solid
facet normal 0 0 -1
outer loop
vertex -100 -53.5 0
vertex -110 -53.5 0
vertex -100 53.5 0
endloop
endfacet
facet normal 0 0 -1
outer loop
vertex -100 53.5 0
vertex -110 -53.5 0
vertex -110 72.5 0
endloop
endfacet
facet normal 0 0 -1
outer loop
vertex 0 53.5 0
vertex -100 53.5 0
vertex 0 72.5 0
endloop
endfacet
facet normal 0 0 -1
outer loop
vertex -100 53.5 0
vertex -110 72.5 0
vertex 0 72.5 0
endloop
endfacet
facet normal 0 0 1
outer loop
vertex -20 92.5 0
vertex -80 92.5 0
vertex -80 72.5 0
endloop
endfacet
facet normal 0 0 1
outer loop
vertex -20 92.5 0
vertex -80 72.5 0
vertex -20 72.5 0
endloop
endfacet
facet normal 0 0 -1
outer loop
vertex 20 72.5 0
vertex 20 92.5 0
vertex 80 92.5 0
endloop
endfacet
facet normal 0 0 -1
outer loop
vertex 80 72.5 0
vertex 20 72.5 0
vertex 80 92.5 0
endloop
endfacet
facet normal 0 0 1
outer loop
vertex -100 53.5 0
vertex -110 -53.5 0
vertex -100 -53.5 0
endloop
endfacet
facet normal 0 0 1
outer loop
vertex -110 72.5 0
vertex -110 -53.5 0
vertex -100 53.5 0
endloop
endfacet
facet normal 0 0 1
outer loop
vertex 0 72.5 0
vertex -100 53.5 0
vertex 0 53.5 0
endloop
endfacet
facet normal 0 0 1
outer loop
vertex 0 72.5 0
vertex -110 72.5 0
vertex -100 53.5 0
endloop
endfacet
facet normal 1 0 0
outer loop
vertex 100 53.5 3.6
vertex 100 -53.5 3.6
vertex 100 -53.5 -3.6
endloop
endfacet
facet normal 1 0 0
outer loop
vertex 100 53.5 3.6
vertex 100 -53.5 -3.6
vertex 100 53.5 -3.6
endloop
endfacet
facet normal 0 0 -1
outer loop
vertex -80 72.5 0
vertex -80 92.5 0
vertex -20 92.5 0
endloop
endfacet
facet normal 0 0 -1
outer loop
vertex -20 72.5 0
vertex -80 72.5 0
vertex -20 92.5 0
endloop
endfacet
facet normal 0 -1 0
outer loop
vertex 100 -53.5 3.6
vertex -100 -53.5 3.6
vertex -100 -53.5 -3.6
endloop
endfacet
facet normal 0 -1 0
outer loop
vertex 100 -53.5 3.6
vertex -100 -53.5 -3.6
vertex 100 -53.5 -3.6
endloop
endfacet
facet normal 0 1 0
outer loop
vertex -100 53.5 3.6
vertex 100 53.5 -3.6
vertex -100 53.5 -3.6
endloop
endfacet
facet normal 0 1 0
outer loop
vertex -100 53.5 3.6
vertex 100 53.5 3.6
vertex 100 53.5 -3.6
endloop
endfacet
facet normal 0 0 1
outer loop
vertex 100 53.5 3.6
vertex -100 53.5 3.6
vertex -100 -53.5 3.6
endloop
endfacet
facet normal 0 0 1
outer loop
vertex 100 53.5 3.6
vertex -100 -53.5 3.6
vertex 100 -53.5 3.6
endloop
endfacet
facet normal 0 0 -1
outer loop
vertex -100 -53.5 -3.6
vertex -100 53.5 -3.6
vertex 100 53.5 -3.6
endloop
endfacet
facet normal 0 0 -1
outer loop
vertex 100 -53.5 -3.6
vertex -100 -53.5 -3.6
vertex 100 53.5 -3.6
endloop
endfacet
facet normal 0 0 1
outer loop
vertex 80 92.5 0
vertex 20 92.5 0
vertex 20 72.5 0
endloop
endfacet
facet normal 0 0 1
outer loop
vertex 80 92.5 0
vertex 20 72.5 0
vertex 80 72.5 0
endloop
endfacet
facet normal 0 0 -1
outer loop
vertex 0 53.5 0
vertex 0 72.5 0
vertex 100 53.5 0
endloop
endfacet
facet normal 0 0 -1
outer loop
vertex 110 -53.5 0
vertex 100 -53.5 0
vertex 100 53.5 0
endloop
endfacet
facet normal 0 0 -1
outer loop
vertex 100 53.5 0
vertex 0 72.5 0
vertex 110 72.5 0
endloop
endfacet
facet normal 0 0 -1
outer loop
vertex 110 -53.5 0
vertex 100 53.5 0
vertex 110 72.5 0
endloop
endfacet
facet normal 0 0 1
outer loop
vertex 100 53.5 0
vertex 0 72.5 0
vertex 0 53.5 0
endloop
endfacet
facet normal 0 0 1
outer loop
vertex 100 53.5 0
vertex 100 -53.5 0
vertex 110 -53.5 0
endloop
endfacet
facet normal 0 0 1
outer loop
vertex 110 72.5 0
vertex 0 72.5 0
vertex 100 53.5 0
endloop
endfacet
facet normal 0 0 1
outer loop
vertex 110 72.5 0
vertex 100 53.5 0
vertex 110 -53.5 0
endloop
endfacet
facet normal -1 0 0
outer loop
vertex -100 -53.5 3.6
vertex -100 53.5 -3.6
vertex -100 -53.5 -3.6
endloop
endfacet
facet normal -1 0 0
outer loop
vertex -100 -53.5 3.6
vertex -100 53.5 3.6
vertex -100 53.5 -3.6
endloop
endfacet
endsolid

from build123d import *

# Parameters (mm, degrees)
BOSS_EXTRUDE1_DEPTH   = 3.6
MINUS_ISOLATION_START = -5e-05
MINUS_ISOLATION_DEPTH = 0.0001
PLUS_ISOLATION_DEPTH  = 5e-05
SKETCH1_4_W           = 60
SKETCH1_4_H           = 20
PLUS_DEPTH            = 5e-05
SKETCH1_5_W           = 60
SKETCH1_5_H           = 20
MINUS_DEPTH           = 5e-05


# Read off the part's stored shape, not the designer's step: minus_isolation
with BuildPart() as part:
    # Sketch1 → Boss-Extrude1 (new, symmetric)
    with BuildSketch(Plane.XY):
        Polygon((-100, 53.5), (-100, -53.5), (100, -53.5), (100, 53.5), (0, 53.5), align=None)
    extrude(amount=BOSS_EXTRUDE1_DEPTH, both=True)


with BuildPart() as body_2:
    # minus_isolation outline → minus_isolation (new body)
    with BuildSketch(Plane.XY.offset(MINUS_ISOLATION_START)):
        Polygon((110, -53.5), (110, 72.5), (0, 72.5), (0, 53.5), (100, 53.5), (100, -53.5), align=None)
    extrude(amount=MINUS_ISOLATION_DEPTH)


with BuildPart() as body_3:
    # Sketch1<6> → plus_isolation (new, symmetric)
    with BuildSketch(Plane.XY):
        Polygon((-110, 72.5), (-110, -53.5), (-100, -53.5), (-100, 53.5), (0, 53.5), (0, 72.5), (-20, 72.5), (-80, 72.5), align=None)
    extrude(amount=PLUS_ISOLATION_DEPTH, both=True)


with BuildPart() as body_4:
    # Sketch1<4> → plus (new, symmetric)
    with BuildSketch(Plane.XY):
        with Locations((-50, 82.5)):
            Rectangle(SKETCH1_4_W, SKETCH1_4_H)
    extrude(amount=PLUS_DEPTH, both=True)


with BuildPart() as body_5:
    # Sketch1<5> → minus (new, symmetric)
    with BuildSketch(Plane.XY):
        with Locations((50, 82.5)):
            Rectangle(SKETCH1_5_W, SKETCH1_5_H)
    extrude(amount=MINUS_DEPTH, both=True)


solid = Compound([part.part, body_2.part, body_3.part, body_4.part, body_5.part])
